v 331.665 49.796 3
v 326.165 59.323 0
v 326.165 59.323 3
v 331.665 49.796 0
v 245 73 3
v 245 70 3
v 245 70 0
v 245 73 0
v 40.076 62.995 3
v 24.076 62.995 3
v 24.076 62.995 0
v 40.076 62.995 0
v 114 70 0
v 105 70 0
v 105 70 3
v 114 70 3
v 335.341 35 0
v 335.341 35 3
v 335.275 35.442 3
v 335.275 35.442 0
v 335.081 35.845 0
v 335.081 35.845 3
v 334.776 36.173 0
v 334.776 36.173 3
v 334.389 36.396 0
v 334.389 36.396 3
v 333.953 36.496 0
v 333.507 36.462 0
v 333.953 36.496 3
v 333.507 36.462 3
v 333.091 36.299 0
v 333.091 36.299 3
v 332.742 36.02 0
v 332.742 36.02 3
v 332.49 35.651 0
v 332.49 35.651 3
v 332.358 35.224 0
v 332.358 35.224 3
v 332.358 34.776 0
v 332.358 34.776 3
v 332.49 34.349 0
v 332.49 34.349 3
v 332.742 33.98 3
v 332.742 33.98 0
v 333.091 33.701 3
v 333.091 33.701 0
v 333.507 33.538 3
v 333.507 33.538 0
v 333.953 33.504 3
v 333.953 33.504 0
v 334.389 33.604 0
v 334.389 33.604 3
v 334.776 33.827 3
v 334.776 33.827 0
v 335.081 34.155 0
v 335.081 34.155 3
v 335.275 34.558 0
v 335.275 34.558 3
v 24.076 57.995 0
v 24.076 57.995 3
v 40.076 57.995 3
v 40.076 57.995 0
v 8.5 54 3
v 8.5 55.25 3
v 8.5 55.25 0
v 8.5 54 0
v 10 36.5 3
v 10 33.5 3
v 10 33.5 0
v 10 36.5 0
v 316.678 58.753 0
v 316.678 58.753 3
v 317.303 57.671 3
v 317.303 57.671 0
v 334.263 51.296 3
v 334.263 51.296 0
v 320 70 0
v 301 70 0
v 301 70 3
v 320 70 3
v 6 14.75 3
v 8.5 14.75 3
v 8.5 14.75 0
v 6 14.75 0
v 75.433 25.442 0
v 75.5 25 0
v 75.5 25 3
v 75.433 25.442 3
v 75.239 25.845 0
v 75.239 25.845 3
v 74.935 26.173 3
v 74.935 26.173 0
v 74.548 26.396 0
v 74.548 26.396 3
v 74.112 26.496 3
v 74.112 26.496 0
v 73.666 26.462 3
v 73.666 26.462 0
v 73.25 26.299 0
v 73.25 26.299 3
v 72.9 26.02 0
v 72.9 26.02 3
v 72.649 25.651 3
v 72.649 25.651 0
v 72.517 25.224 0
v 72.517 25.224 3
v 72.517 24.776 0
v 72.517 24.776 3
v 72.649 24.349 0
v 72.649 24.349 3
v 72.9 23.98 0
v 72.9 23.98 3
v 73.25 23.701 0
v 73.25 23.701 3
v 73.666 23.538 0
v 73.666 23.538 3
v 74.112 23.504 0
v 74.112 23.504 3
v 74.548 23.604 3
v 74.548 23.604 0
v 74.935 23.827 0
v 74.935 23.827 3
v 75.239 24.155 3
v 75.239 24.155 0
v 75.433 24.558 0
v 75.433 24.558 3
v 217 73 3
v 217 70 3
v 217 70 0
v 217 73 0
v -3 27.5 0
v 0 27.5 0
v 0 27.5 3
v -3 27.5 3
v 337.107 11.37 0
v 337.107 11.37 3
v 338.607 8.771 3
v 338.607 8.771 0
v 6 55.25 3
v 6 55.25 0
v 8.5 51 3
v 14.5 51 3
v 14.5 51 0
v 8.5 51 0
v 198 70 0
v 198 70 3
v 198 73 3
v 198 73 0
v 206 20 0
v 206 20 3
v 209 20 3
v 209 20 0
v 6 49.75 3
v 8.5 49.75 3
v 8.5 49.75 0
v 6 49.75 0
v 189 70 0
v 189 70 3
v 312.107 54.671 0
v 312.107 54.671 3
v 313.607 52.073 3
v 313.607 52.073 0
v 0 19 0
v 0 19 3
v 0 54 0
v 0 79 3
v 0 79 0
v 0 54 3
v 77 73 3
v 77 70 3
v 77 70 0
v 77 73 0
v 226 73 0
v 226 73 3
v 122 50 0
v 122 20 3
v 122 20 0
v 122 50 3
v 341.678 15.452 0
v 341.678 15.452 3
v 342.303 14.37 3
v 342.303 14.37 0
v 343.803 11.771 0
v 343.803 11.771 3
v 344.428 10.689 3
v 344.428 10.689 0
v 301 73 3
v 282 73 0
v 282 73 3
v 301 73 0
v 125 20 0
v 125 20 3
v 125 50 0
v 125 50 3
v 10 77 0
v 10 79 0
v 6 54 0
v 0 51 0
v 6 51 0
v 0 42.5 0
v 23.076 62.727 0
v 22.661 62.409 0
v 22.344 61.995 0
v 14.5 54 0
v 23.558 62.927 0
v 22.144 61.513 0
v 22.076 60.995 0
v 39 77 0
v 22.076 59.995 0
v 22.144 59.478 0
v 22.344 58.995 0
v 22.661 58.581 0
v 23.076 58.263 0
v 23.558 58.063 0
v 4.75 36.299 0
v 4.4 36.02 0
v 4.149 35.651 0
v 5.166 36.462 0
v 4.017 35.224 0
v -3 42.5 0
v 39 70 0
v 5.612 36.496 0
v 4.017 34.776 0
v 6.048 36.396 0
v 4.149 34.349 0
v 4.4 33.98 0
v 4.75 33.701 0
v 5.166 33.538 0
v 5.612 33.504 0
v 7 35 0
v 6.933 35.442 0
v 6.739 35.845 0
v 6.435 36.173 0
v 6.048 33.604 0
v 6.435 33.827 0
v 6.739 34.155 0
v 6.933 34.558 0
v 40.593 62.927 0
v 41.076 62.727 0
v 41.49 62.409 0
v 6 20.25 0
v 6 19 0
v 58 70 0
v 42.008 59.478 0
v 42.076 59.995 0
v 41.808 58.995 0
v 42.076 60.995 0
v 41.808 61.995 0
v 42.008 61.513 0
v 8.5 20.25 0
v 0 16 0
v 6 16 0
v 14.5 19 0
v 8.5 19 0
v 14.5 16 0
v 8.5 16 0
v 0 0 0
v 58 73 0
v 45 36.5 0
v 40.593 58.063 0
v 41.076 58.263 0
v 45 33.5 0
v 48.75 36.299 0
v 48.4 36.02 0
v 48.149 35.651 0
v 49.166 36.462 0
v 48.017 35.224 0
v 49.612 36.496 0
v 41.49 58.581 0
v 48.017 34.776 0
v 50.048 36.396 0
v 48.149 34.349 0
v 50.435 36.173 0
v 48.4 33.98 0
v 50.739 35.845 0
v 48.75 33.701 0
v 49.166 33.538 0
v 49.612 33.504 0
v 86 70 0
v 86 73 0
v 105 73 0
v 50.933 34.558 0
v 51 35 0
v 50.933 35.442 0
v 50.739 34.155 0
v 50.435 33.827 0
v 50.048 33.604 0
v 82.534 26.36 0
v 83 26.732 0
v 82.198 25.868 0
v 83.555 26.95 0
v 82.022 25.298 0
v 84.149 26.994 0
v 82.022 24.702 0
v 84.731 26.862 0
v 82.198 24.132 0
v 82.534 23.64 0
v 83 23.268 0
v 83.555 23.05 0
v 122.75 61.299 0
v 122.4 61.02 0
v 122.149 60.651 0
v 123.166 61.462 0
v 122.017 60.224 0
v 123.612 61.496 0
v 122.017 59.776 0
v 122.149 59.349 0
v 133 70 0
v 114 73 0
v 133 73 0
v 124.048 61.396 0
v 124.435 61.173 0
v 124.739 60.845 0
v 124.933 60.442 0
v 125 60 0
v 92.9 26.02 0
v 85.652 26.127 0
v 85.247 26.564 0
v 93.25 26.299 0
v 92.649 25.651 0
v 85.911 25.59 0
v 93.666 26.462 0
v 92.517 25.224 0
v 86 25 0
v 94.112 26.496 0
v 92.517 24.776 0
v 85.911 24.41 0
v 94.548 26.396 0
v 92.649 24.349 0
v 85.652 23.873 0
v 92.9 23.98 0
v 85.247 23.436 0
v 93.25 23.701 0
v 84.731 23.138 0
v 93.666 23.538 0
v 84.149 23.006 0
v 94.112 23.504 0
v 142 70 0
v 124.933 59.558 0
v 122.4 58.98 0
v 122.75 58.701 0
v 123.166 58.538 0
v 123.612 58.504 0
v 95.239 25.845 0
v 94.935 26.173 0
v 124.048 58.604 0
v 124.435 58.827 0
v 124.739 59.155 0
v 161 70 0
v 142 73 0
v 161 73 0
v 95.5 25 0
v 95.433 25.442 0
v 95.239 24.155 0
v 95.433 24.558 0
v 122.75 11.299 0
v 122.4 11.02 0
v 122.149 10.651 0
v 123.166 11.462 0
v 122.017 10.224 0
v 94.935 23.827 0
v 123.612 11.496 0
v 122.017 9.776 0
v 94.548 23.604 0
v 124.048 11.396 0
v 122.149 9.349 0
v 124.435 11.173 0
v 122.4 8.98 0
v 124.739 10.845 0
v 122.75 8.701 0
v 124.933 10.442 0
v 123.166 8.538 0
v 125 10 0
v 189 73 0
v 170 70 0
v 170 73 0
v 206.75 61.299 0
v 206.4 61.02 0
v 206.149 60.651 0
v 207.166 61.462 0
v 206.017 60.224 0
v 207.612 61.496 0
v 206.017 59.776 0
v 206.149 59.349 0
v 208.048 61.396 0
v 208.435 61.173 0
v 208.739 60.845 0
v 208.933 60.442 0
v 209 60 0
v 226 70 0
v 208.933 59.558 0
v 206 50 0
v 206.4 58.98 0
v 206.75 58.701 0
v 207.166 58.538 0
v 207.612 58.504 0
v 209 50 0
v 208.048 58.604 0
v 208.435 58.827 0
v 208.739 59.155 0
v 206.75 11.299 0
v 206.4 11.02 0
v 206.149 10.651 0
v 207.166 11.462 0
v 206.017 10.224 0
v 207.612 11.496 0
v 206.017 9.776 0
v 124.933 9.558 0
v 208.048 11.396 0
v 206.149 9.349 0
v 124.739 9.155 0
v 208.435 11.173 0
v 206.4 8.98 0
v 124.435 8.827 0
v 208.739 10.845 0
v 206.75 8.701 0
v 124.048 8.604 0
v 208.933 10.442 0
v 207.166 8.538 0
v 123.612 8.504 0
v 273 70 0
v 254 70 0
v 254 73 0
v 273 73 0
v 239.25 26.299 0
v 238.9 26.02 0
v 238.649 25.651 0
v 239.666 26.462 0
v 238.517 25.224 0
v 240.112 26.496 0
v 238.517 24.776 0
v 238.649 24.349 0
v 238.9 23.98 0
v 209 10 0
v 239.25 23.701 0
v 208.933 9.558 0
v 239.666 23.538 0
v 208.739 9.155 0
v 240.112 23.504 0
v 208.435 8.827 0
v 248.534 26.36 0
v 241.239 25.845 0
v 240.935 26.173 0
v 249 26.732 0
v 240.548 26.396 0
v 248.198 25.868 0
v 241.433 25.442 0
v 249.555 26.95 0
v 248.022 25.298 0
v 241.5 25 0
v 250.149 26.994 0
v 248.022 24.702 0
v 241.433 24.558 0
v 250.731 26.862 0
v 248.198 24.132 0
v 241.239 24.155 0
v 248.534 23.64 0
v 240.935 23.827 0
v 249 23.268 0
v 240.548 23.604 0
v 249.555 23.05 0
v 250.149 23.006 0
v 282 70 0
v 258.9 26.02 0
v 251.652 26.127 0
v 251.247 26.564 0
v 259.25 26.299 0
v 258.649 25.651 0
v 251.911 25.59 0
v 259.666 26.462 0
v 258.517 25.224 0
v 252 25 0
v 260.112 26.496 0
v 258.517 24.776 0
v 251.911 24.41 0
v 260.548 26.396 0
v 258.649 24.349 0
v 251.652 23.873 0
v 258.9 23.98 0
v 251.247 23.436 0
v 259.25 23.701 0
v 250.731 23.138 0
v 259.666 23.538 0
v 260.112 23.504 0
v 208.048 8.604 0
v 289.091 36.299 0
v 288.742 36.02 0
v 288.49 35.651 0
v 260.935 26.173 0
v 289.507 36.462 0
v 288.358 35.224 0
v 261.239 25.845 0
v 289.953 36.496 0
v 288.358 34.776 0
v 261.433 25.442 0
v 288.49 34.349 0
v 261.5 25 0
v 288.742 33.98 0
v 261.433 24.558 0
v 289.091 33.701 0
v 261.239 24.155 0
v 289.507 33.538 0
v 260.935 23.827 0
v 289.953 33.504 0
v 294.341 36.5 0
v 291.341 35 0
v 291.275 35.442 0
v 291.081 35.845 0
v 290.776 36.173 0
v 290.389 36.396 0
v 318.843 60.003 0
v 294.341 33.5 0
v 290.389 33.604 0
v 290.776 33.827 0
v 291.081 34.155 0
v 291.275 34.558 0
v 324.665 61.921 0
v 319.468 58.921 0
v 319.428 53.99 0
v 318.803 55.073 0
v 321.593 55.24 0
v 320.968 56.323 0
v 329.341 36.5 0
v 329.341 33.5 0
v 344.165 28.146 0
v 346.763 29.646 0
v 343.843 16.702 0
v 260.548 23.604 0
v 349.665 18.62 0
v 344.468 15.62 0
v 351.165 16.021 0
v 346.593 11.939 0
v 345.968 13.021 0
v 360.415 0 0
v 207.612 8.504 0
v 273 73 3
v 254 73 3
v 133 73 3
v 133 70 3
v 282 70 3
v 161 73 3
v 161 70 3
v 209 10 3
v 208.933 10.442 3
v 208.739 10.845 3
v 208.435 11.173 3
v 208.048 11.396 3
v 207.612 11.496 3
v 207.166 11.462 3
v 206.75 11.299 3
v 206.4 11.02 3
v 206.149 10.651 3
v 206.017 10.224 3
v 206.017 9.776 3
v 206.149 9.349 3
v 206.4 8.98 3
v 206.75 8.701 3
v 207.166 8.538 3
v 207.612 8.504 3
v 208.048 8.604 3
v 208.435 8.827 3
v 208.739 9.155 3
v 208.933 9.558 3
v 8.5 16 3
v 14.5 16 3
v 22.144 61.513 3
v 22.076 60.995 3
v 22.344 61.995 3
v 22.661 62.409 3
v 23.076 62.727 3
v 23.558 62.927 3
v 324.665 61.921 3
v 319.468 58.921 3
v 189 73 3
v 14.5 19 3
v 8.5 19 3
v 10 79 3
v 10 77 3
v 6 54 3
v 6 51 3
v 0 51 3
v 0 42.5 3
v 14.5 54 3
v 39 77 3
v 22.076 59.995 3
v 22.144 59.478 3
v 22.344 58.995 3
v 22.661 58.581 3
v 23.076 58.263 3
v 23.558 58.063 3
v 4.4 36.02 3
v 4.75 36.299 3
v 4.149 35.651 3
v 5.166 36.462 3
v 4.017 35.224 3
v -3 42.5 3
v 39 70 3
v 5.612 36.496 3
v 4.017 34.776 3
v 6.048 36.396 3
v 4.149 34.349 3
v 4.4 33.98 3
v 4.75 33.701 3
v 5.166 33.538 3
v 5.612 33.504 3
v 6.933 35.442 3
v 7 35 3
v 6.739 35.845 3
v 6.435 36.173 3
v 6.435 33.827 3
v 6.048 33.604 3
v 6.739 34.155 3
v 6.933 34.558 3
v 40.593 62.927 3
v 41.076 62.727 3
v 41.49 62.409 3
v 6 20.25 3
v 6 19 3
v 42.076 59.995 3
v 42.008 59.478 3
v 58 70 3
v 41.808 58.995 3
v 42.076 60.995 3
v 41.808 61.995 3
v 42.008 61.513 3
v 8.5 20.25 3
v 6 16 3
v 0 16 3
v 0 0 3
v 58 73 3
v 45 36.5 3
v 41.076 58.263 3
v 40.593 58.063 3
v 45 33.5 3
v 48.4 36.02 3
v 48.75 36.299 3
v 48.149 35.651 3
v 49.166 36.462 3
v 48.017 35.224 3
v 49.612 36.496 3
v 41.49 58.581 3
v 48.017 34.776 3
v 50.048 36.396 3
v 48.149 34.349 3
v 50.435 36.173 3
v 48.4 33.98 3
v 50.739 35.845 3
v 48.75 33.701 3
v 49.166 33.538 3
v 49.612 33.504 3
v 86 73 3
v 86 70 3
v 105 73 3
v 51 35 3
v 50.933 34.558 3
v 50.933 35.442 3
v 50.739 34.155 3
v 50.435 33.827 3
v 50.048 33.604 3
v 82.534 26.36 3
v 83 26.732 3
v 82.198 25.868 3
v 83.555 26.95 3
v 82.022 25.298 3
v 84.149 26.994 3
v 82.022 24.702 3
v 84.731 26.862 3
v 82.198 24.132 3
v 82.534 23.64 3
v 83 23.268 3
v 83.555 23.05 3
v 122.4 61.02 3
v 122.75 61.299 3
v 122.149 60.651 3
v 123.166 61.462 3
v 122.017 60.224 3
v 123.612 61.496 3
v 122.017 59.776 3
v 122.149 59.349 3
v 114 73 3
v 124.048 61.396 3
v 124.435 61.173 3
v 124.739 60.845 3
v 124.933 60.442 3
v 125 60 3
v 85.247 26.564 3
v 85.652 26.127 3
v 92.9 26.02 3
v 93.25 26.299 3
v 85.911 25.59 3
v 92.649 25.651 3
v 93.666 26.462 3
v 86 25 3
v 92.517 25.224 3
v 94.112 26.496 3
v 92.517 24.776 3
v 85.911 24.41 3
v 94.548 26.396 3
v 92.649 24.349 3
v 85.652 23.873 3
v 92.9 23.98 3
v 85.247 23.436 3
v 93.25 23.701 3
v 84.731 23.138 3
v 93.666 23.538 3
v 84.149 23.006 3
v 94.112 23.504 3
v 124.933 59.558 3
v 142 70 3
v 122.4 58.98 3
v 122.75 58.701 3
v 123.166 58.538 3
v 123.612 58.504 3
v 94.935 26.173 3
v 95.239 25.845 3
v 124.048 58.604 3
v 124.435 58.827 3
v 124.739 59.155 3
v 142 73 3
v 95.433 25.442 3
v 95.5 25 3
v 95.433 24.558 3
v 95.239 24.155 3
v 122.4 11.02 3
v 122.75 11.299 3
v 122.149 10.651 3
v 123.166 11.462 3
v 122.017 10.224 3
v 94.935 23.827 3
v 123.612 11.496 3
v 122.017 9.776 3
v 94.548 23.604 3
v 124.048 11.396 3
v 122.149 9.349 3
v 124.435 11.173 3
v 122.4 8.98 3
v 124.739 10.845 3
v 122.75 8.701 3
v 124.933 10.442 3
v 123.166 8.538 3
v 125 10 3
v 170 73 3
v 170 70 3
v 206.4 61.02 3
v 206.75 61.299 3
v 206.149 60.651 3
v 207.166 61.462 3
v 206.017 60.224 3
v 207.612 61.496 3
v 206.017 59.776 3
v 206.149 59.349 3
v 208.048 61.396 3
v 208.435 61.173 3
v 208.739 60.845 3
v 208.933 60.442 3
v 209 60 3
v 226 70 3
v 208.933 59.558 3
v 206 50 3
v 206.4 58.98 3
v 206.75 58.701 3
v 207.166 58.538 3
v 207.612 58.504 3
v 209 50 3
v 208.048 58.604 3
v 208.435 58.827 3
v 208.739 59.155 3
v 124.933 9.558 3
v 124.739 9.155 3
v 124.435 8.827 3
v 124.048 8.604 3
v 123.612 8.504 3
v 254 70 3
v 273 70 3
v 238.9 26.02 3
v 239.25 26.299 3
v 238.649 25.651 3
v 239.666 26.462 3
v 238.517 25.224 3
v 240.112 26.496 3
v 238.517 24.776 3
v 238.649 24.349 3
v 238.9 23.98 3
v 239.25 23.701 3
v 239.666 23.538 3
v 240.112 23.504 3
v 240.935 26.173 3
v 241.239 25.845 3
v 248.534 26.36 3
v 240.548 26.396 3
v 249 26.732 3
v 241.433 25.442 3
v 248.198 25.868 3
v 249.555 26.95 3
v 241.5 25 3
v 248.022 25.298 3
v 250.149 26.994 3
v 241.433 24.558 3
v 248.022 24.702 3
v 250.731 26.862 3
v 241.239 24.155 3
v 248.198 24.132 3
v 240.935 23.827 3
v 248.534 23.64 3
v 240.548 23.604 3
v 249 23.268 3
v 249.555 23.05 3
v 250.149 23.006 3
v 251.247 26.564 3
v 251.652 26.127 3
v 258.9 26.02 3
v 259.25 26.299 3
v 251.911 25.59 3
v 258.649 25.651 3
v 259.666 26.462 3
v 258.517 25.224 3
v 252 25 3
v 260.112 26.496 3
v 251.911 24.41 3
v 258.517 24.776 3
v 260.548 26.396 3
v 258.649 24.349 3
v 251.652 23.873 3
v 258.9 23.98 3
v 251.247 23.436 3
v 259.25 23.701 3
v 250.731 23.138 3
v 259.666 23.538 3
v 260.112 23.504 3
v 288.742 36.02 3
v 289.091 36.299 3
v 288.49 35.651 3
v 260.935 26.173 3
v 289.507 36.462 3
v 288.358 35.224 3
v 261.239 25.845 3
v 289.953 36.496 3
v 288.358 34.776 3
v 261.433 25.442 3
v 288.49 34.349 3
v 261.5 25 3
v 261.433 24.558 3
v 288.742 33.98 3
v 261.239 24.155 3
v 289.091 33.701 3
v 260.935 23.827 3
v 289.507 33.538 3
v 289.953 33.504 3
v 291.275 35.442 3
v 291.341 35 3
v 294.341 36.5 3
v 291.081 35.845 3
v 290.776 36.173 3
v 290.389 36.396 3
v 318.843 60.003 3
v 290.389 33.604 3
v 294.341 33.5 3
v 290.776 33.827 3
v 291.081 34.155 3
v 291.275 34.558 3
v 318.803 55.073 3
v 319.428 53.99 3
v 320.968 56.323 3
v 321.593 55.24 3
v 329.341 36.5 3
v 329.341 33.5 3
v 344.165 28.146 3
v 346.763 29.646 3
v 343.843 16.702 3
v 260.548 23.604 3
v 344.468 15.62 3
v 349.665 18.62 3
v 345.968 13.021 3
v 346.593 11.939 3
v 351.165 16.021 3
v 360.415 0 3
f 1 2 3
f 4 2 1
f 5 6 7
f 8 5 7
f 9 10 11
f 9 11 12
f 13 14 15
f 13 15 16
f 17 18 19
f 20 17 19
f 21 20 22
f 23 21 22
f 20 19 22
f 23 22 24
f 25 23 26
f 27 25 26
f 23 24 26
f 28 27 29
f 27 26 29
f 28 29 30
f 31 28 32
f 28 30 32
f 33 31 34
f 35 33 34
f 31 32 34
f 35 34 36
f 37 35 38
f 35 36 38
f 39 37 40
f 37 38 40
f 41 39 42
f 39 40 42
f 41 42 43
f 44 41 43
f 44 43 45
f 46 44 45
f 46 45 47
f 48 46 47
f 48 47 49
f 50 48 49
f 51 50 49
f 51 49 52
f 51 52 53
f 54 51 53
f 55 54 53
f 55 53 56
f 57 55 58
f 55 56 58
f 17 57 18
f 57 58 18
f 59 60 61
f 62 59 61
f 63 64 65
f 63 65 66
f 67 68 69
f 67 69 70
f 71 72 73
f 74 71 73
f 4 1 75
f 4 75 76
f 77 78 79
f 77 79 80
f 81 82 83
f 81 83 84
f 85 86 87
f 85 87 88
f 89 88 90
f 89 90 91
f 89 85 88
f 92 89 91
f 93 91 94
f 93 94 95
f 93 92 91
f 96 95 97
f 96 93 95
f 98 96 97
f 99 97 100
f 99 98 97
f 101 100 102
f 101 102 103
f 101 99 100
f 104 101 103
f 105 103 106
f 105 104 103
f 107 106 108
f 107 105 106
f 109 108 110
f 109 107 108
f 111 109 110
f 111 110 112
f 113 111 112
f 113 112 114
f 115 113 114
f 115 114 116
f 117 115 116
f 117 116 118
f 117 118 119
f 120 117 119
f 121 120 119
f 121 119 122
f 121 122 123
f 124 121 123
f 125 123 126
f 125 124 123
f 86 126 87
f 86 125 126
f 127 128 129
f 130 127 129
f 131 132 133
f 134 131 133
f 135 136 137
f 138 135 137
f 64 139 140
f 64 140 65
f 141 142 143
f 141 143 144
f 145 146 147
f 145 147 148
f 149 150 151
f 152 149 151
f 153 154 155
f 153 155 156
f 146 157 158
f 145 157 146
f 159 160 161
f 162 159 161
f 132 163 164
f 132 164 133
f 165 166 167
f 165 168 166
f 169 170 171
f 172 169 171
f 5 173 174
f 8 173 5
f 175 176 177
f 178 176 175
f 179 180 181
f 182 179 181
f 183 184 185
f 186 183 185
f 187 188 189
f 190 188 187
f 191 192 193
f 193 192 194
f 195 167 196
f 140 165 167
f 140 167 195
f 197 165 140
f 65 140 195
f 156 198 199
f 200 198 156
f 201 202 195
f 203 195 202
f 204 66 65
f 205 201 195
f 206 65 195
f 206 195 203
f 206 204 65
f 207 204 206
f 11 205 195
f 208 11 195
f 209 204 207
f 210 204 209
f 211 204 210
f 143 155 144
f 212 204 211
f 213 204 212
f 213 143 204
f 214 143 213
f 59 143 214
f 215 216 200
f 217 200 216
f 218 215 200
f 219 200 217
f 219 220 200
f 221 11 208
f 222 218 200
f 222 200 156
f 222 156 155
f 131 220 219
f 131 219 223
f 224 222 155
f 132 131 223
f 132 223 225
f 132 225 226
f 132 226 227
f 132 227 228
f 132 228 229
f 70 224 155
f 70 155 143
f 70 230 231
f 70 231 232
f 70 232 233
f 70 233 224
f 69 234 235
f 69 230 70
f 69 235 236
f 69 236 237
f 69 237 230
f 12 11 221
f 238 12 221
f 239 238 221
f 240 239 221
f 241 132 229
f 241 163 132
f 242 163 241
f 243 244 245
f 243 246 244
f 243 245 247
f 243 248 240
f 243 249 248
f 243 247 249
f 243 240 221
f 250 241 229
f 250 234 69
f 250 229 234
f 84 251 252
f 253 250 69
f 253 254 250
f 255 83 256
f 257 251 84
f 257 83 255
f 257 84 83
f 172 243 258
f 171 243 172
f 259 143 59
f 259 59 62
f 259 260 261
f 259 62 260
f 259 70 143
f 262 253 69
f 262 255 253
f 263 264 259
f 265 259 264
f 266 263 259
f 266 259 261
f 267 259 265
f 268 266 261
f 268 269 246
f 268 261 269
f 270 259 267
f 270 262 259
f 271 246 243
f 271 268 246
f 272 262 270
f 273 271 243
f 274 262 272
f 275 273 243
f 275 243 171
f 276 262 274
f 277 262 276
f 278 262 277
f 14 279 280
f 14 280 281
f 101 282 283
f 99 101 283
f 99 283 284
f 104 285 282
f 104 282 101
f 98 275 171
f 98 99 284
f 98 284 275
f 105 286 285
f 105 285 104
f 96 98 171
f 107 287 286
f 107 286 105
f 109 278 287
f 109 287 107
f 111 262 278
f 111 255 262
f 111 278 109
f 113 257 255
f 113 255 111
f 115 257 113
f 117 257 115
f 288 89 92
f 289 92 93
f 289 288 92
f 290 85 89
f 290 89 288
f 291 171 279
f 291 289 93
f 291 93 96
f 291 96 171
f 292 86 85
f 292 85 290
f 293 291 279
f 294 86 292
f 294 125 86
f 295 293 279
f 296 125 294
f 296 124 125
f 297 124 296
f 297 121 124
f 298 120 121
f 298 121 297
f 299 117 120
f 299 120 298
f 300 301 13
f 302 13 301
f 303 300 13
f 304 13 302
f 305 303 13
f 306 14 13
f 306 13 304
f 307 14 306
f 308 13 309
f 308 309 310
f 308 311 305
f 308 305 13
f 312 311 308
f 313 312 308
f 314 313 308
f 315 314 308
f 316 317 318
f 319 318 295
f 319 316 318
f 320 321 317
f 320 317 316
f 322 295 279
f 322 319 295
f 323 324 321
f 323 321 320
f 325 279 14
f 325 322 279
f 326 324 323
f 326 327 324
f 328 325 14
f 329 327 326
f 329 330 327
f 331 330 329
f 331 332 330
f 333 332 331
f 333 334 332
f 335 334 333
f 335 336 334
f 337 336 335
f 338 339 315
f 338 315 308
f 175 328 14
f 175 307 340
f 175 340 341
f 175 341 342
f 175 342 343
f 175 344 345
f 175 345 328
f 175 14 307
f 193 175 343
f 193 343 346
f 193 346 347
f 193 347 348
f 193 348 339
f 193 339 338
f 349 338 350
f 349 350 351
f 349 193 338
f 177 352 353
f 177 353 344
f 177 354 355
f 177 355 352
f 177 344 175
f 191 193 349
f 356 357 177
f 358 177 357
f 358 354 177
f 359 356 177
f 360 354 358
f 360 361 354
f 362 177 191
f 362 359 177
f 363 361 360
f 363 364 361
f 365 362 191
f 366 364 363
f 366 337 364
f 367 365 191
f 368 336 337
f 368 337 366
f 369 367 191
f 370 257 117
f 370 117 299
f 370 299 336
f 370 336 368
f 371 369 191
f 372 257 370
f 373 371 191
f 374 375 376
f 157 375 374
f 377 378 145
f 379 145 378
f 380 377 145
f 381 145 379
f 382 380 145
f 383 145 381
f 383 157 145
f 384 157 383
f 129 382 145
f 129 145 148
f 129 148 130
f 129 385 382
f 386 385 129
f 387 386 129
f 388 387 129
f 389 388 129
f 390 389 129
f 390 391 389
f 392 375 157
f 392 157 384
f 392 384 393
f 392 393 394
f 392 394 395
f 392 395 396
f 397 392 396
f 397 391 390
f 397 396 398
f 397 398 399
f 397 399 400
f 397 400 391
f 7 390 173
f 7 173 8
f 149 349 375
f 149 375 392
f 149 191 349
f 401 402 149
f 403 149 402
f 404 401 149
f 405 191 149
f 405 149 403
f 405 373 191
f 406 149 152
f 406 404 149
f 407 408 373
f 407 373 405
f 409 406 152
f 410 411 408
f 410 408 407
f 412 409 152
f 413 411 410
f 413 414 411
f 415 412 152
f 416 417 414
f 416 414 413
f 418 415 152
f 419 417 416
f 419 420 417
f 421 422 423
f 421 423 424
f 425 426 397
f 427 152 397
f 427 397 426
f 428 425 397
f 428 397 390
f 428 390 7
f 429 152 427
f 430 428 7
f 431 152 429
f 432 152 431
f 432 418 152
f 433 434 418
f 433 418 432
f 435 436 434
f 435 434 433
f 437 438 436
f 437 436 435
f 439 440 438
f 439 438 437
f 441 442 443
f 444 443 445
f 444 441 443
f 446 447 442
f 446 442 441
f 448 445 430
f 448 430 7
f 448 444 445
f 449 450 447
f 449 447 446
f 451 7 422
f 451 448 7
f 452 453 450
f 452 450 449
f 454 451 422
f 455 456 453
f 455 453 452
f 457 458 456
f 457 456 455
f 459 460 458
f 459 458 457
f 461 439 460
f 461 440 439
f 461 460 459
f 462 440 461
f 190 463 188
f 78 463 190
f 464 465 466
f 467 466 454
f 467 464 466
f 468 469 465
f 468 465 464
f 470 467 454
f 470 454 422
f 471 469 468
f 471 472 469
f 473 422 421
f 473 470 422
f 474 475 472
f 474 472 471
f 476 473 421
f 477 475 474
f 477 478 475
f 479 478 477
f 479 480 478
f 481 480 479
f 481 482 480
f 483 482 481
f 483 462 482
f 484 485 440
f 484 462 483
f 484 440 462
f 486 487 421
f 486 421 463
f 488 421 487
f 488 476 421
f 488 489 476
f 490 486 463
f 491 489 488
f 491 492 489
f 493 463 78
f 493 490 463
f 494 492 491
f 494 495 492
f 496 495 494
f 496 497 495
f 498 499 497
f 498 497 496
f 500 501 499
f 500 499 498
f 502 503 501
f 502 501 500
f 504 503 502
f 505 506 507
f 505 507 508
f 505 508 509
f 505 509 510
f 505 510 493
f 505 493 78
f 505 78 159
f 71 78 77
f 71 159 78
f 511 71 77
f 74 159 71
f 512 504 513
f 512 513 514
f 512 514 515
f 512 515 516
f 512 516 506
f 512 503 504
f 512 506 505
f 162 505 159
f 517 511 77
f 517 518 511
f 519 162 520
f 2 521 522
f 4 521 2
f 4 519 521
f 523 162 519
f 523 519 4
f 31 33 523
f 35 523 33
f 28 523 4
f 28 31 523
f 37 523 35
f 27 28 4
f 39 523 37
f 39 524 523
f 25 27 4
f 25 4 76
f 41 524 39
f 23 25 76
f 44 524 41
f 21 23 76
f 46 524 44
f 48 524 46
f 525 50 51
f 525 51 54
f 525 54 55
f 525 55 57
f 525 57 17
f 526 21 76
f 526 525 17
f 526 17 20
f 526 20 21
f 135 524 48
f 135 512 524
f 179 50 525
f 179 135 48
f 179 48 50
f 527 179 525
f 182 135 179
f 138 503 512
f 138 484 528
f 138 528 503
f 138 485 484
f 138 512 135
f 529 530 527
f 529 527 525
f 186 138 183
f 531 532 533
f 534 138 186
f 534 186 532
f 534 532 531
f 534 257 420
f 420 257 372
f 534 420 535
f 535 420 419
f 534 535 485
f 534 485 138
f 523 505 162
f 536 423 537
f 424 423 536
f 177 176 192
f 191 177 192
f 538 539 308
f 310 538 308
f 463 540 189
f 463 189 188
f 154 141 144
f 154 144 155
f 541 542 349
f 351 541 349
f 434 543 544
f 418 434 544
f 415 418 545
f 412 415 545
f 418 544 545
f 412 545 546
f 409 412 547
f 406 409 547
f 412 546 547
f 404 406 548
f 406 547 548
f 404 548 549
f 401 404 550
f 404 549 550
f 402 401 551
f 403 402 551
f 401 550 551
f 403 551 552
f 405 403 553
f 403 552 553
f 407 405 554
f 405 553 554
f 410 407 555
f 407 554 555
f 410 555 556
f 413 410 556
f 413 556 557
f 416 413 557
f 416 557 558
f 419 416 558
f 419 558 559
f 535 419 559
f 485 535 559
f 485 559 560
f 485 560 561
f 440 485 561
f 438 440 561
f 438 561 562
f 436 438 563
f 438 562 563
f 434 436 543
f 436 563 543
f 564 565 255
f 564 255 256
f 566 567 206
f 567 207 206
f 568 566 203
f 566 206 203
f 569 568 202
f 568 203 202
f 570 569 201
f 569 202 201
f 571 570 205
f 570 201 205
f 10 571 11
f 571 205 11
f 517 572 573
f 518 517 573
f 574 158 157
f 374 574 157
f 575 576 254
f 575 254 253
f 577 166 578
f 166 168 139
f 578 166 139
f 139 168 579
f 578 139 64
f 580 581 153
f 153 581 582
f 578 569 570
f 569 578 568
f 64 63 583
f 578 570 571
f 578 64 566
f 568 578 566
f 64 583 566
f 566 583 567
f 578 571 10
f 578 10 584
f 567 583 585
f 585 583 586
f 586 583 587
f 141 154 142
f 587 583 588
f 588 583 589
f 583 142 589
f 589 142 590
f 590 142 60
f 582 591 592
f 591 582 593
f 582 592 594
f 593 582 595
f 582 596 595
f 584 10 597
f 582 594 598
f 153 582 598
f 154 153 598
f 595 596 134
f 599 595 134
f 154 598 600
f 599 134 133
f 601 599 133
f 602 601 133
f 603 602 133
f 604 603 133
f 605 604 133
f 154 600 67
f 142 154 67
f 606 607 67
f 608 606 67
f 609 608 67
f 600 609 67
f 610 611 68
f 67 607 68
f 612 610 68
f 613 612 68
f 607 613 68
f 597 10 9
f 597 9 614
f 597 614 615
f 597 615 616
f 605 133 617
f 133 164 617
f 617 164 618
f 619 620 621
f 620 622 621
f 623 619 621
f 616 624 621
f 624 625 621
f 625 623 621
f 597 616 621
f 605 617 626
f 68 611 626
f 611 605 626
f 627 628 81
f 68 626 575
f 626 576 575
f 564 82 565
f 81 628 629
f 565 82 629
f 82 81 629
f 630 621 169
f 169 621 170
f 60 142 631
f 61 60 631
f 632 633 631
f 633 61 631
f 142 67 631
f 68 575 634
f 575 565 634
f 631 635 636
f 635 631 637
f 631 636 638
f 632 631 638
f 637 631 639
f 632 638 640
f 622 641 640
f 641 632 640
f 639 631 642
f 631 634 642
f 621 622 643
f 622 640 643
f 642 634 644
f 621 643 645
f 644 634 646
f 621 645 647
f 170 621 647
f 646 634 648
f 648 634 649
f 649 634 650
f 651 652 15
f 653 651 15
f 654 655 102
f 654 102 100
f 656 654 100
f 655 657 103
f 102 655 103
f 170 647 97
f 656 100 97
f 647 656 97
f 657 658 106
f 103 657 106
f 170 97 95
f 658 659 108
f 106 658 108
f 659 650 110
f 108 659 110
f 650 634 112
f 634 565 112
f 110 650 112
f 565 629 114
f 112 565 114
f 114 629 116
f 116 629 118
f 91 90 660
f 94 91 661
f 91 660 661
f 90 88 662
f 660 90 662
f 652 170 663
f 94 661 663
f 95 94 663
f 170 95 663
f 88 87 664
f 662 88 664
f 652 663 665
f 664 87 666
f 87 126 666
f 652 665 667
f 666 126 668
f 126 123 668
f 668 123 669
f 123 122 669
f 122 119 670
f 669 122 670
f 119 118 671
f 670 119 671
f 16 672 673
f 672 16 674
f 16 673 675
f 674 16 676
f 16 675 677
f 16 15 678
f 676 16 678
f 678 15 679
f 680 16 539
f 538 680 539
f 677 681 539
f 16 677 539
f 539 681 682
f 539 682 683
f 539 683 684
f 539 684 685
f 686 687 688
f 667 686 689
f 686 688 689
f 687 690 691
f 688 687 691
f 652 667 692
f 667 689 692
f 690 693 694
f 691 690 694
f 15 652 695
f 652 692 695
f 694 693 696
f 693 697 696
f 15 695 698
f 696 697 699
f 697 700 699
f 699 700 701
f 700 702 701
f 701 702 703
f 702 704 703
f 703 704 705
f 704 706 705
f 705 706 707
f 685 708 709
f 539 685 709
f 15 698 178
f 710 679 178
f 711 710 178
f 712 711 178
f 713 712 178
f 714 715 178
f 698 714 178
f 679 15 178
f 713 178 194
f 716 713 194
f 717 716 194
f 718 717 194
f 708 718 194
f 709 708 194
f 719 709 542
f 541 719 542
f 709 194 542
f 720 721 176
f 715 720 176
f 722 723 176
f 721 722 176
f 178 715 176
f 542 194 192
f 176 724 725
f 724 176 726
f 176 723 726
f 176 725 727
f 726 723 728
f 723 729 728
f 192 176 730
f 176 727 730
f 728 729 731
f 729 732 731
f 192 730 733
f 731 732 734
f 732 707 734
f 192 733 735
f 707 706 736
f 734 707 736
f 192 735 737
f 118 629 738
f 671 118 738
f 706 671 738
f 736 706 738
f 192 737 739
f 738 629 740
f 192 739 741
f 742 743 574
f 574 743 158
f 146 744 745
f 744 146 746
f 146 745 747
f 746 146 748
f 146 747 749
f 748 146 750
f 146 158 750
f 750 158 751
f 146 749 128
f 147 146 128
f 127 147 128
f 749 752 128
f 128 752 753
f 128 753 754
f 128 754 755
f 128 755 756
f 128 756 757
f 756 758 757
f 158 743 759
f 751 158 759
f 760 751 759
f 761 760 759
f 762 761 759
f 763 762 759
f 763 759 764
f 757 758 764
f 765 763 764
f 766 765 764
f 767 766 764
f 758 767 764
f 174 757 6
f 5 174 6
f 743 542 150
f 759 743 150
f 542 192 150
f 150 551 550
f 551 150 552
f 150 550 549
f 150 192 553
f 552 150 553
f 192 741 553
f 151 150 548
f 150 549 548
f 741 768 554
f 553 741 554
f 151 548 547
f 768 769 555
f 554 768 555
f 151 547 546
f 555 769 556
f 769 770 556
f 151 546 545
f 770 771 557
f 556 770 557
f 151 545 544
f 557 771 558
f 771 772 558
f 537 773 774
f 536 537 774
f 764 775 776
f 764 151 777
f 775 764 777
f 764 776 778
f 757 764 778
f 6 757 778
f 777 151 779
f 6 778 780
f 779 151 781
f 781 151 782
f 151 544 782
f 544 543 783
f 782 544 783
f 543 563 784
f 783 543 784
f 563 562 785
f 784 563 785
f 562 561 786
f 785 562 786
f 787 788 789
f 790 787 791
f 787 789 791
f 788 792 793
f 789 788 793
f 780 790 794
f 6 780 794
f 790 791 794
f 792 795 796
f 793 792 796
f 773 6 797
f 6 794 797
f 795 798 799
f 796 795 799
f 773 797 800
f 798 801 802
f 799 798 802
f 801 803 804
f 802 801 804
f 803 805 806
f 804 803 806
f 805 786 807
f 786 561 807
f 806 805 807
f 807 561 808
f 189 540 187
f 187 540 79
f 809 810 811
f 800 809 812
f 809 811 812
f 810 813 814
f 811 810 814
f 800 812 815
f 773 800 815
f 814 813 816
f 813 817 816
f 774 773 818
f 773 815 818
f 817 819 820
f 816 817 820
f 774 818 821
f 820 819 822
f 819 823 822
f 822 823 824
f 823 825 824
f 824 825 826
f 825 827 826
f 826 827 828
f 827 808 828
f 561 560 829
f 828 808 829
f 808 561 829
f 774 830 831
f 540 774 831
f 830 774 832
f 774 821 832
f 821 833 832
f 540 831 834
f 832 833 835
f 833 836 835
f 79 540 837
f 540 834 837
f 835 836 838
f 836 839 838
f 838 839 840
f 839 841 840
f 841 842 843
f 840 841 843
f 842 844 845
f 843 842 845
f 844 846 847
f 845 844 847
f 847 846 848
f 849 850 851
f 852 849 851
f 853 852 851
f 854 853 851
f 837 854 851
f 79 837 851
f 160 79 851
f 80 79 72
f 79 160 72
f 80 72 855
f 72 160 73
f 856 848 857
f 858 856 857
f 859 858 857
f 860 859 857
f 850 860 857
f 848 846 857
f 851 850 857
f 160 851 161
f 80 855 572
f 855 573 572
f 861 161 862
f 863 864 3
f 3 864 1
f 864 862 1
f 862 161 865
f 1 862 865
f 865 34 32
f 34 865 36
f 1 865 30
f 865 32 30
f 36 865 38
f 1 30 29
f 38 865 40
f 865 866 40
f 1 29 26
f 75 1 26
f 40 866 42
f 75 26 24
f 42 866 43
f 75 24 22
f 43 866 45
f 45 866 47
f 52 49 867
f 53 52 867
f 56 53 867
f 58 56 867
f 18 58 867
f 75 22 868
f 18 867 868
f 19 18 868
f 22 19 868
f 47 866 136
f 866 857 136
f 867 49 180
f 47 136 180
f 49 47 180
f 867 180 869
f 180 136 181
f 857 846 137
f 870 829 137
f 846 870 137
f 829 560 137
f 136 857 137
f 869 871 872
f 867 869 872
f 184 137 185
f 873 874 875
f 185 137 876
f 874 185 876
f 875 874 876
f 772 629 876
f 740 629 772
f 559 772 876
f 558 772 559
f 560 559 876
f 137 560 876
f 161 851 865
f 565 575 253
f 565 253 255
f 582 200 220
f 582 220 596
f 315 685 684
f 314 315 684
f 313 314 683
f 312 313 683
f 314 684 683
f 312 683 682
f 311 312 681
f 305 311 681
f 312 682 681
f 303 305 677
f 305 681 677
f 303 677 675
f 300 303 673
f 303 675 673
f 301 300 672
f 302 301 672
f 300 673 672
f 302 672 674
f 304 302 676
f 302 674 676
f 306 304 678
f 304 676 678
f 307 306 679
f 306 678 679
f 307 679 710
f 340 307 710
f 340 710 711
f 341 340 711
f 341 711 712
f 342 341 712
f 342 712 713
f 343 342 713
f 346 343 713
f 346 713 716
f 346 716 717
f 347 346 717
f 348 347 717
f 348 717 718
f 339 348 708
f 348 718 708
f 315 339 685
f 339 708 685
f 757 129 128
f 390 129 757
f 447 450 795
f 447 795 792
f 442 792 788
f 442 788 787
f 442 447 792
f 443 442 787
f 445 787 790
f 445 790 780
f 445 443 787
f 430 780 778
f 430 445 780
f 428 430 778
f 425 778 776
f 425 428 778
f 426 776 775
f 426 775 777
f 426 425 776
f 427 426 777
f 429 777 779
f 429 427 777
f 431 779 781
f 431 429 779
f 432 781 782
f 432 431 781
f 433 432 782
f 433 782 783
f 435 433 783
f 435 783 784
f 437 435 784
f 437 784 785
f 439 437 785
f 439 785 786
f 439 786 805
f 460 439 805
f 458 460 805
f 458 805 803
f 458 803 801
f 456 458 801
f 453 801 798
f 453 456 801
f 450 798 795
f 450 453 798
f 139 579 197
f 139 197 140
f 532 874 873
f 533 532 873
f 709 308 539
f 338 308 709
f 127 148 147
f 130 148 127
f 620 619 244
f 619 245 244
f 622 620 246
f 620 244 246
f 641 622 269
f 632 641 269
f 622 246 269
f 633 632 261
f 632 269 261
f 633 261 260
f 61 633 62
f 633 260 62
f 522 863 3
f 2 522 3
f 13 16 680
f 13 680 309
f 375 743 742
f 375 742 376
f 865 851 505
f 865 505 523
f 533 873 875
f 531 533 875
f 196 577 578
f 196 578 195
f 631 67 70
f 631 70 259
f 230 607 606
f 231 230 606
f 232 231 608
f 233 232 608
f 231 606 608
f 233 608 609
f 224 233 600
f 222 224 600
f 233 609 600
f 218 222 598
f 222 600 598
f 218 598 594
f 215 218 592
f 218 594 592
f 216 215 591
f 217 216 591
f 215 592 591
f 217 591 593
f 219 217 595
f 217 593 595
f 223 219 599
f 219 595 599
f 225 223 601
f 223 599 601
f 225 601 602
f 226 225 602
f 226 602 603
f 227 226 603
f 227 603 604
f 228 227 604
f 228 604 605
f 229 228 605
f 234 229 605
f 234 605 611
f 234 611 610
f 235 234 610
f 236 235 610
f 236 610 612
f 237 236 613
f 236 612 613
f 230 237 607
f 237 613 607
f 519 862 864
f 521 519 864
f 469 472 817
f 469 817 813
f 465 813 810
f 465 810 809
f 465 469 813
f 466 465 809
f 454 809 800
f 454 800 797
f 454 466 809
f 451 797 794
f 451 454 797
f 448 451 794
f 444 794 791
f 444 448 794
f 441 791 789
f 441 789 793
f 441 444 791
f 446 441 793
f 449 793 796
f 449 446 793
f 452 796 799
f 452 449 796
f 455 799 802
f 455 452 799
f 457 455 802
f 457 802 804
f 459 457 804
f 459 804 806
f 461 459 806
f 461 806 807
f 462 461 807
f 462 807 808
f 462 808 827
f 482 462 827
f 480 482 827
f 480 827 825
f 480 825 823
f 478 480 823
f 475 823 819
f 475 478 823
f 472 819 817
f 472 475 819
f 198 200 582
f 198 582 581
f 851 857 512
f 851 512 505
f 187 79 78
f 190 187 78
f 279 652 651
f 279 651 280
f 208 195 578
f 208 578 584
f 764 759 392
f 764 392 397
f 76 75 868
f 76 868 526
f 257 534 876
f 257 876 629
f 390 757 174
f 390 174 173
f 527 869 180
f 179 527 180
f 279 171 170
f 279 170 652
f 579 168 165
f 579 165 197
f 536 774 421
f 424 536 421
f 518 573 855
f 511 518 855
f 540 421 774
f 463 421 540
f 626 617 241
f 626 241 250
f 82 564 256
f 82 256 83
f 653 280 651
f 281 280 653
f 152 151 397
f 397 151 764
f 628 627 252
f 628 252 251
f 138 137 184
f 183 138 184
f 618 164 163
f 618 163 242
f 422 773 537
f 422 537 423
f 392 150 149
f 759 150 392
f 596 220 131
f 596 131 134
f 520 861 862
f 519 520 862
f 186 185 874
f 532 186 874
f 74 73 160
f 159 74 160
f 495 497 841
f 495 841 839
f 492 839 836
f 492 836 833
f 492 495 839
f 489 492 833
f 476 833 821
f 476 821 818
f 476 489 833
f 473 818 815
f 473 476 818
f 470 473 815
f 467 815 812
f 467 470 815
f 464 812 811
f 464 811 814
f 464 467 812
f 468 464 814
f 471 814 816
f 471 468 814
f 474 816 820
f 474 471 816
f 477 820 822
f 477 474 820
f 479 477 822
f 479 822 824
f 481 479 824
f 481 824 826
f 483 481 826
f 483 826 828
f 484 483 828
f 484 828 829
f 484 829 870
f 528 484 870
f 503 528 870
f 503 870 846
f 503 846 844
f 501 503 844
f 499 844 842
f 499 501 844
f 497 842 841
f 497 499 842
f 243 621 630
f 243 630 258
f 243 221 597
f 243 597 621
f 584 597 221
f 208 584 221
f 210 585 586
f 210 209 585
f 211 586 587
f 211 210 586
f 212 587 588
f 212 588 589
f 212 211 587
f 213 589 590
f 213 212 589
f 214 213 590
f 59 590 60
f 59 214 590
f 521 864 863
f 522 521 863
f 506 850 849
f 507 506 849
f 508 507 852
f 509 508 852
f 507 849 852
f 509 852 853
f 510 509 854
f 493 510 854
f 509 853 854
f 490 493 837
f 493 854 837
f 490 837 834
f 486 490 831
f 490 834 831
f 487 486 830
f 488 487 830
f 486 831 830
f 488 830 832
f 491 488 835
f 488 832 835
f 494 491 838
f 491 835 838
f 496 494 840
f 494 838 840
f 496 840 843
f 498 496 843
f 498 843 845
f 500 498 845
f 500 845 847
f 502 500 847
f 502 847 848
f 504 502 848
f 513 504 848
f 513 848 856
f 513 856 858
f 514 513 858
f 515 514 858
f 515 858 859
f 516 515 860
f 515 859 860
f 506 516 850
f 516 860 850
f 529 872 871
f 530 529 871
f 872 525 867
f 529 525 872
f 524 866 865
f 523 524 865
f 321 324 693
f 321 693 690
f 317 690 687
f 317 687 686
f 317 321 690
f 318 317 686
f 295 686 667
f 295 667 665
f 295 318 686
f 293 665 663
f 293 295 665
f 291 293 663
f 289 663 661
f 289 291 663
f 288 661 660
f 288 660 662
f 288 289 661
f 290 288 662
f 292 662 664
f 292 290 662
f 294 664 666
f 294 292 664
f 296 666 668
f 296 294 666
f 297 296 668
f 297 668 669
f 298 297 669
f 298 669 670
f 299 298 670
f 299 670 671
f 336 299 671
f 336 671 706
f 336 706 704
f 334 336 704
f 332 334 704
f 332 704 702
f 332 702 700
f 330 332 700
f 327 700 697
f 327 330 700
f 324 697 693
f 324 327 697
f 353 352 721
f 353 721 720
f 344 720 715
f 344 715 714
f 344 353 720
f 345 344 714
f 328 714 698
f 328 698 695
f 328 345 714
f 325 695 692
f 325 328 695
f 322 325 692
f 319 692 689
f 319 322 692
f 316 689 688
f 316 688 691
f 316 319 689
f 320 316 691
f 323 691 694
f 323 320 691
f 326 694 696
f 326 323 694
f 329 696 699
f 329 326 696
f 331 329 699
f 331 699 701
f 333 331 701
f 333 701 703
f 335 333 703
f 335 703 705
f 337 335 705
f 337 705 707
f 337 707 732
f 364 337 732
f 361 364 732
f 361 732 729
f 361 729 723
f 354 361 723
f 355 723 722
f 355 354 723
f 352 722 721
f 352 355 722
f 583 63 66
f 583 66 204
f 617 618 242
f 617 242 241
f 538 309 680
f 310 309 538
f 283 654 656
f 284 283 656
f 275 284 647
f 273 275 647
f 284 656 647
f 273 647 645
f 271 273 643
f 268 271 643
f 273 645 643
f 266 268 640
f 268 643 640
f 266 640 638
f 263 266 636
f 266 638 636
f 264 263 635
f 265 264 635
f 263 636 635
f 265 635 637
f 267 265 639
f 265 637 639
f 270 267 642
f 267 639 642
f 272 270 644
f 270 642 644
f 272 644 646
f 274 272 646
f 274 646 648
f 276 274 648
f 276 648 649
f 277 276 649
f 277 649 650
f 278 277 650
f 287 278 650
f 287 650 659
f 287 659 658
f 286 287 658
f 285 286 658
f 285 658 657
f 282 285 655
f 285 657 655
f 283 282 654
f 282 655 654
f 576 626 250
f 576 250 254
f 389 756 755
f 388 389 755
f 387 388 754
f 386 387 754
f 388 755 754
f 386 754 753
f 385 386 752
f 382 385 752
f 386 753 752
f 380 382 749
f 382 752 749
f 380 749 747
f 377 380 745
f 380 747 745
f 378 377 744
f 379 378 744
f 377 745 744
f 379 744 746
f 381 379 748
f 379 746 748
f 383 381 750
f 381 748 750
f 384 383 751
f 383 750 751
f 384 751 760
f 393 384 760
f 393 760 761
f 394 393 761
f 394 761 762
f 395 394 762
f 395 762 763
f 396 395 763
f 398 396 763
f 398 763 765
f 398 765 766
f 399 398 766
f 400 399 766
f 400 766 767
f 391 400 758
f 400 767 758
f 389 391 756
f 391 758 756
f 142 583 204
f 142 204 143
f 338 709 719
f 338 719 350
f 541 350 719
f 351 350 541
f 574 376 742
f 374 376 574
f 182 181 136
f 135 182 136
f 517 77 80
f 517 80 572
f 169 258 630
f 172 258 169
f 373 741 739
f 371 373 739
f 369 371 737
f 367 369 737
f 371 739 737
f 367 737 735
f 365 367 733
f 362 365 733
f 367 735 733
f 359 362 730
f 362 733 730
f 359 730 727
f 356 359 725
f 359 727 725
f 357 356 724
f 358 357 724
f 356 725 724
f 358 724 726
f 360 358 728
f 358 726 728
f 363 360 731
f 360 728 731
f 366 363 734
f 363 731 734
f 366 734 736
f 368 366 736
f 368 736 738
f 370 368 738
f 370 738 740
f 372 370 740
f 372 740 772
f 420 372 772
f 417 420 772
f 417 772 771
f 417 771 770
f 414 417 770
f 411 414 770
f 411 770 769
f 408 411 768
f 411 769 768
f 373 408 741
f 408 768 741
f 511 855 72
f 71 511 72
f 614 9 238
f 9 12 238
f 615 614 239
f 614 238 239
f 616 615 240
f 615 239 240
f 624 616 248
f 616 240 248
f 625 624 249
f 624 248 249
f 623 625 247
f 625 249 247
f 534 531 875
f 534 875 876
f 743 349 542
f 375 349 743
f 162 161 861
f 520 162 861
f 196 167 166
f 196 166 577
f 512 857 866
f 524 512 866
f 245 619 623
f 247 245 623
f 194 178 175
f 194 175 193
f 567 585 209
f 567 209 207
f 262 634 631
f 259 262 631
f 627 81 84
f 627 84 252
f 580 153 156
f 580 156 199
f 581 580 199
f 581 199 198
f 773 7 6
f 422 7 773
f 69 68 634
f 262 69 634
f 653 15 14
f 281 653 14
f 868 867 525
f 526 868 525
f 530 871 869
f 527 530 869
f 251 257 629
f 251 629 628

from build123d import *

# Parameters (mm, degrees)
SKETCH_1_R             = 2
SKETCH_1_R_2           = 1.5
EXTRUDE_1_DEPTH        = 3
SKETCH_2_W             = 19
SKETCH_2_H             = 3
EXTRUDE_2_DEPTH        = 3
PATTERN_LINEAR_1_COUNT = 9
PATTERN_LINEAR_1_PITCH = 28
SKETCH_3_W             = 3
SKETCH_3_H             = 30
CUT_EXTRUDE_1_DEPTH    = 3
SKETCH_4_W             = 35
SKETCH_4_H             = 3
CUT_EXTRUDE_2_DEPTH    = 3
SKETCH_5_R             = 1.5
CUT_EXTRUDE_3_DEPTH    = 3
CUT_EXTRUDE_4_DEPTH    = 3
CUT_EXTRUDE_5_DEPTH    = 3
SKETCH_8_W             = 39
SKETCH_8_H             = 3
EXTRUDE_3_DEPTH        = 9
SKETCH_9_W             = 29
SKETCH_9_H             = 3
CUT_EXTRUDE_6_DEPTH    = 2
SKETCH_11_W            = 3
SKETCH_11_H            = 25
EXTRUDE_5_DEPTH        = 3
SKETCH_12_W            = 3
SKETCH_12_H            = 15
EXTRUDE_6_DEPTH        = 3
SKETCH_13_W            = 20
SKETCH_13_H            = 5
CUT_EXTRUDE_7_DEPTH    = 3
FILLET_1_R             = 2


with BuildPart() as part:
    # Эскиз1 → Бобышка-Вытянуть1 (new body)
    with BuildSketch(Plane.XY):
        Polygon((320, 70), (360.414518843, 0), (0, 0), (0, 70), align=None)
        with Locations((84, 25)):
            Circle(SKETCH_1_R, mode=Mode.SUBTRACT)
        with Locations((250, 25)):
            Circle(SKETCH_1_R, mode=Mode.SUBTRACT)
        with Locations((94, 25)):
            Circle(SKETCH_1_R_2, mode=Mode.SUBTRACT)
        with Locations((74, 25)):
            Circle(SKETCH_1_R_2, mode=Mode.SUBTRACT)
        with Locations((240, 25)):
            Circle(SKETCH_1_R_2, mode=Mode.SUBTRACT)
        with Locations((260, 25)):
            Circle(SKETCH_1_R_2, mode=Mode.SUBTRACT)
    extrude(amount=EXTRUDE_1_DEPTH)

    # Эскиз2 → Бобышка-Вытянуть2 (add)
    with BuildSketch(Plane(origin=(0, 70, 0), x_dir=(1, 0, 0), z_dir=(0, 1, 0))):
        with Locations((291.5, -1.5)):
            Rectangle(SKETCH_2_W, SKETCH_2_H)
    extrude_2 = extrude(amount=EXTRUDE_2_DEPTH)

    # Линейный массив1: Бобышка-Вытянуть2 ×9
    with Locations(*[(-i * PATTERN_LINEAR_1_PITCH, 0, 0) for i in range(1, PATTERN_LINEAR_1_COUNT)]):
        add(extrude_2)

    # Эскиз3 → Вырез-Вытянуть1 (cut)
    with BuildSketch(Plane.XY.offset(3)):
        with Locations((207.5, 35)):
            Rectangle(SKETCH_3_W, SKETCH_3_H)
        with Locations((123.5, 35)):
            Rectangle(SKETCH_3_W, SKETCH_3_H)
    extrude(amount=-CUT_EXTRUDE_1_DEPTH, mode=Mode.SUBTRACT)

    # Эскиз4 → Вырез-Вытянуть2 (cut)
    with BuildSketch(Plane.XY.offset(3)):
        with Locations((311.841234018, 35)):
            Rectangle(SKETCH_4_W, SKETCH_4_H)
        with Locations((27.5, 35)):
            Rectangle(SKETCH_4_W, SKETCH_4_H)
    extrude(amount=-CUT_EXTRUDE_2_DEPTH, mode=Mode.SUBTRACT)

    # Эскиз5 → Вырез-Вытянуть3 (cut)
    with BuildSketch(Plane.XY.offset(3)):
        with Locations((5.5, 35)):
            Circle(SKETCH_5_R)
        with Locations((49.5, 35)):
            Circle(SKETCH_5_R)
        with Locations((123.5, 60)):
            Circle(SKETCH_5_R)
        with Locations((123.5, 10)):
            Circle(SKETCH_5_R)
        with Locations((207.5, 60)):
            Circle(SKETCH_5_R)
        with Locations((207.5, 10)):
            Circle(SKETCH_5_R)
        with Locations((289.841234018, 35)):
            Circle(SKETCH_5_R)
        with Locations((333.841234018, 35)):
            Circle(SKETCH_5_R)
    extrude(amount=-CUT_EXTRUDE_3_DEPTH, mode=Mode.SUBTRACT)

    # Эскиз6 → Вырез-Вытянуть4 (cut)
    with BuildSketch(Plane.XY.offset(3)):
        Polygon((0, 54), (6, 54), (6, 55.25), (8.5, 55.25), (8.5, 54), (14.5, 54), (14.5, 51), (8.5, 51), (8.5, 49.75), (6, 49.75), (6, 51), (0, 51), align=None)
        Polygon((0, 19), (6, 19), (6, 20.25), (8.5, 20.25), (8.5, 19), (14.5, 19), (14.5, 16), (8.5, 16), (8.5, 14.75), (6, 14.75), (6, 16), (0, 16), align=None)
    extrude(amount=-CUT_EXTRUDE_4_DEPTH, mode=Mode.SUBTRACT)

    # Эскиз7 → Вырез-Вытянуть5 (cut)
    with BuildSketch(Plane.XY.offset(3)):
        Polygon((324.664518843, 61.920816371), (319.468366421, 58.920816371), (318.843366421, 60.003348125), (316.678302911, 58.753348125), (317.303302911, 57.670816371), (312.107150488, 54.670816371), (313.607150488, 52.072740159), (318.803302911, 55.072740159), (319.428302911, 53.990208405), (321.593366421, 55.240208405), (320.968366421, 56.322740159), (326.164518843, 59.322740159), align=None)
        Polygon((349.664518843, 18.619546181), (344.468366421, 15.619546181), (343.843366421, 16.702077936), (341.678302911, 15.452077936), (342.303302911, 14.369546181), (337.107150488, 11.369546181), (338.607150488, 8.77146997), (343.803302911, 11.77146997), (344.428302911, 10.688938215), (346.593366421, 11.938938215), (345.968366421, 13.02146997), (351.164518843, 16.02146997), align=None)
    extrude(amount=-CUT_EXTRUDE_5_DEPTH, mode=Mode.SUBTRACT)

    # Эскиз8 → Бобышка-Вытянуть3 (add)
    with BuildSketch(Plane(origin=(0, 70, 0), x_dir=(1, 0, 0), z_dir=(0, 1, 0))):
        with Locations((19.5, -1.5)):
            Rectangle(SKETCH_8_W, SKETCH_8_H)
    extrude(amount=EXTRUDE_3_DEPTH)

    # Эскиз9 → Вырез-Вытянуть6 (cut)
    with BuildSketch(Plane(origin=(0, 79, 0), x_dir=(1, 0, 0), z_dir=(0, 1, 0))):
        with Locations((24.5, -1.5)):
            Rectangle(SKETCH_9_W, SKETCH_9_H)
    extrude(amount=-CUT_EXTRUDE_6_DEPTH, mode=Mode.SUBTRACT)

    # Эскиз11 → Бобышка-Вытянуть5 (add)
    with BuildSketch(Plane(origin=(270.310889132, 156.064064606, 0), x_dir=(0, 0, -1), z_dir=(0.8660254037844416, 0.4999999999999949, 0))):
        with Locations((-1.5, -135.207259422)):
            Rectangle(SKETCH_11_W, SKETCH_11_H)
    extrude(amount=EXTRUDE_5_DEPTH)

    # Эскиз12 → Бобышка-Вытянуть6 (add)
    with BuildSketch(Plane.ZY):
        with Locations((1.5, 35)):
            Rectangle(SKETCH_12_W, SKETCH_12_H)
    extrude(amount=EXTRUDE_6_DEPTH)

    # Эскиз13 → Вырез-Вытянуть7 (cut)
    with BuildSketch(Plane.XY.offset(3)):
        with Locations((32.07564967, 60.49517076)):
            Rectangle(SKETCH_13_W, SKETCH_13_H)
    extrude(amount=-CUT_EXTRUDE_7_DEPTH, mode=Mode.SUBTRACT)

    # Скругление1
    fillet_1_edges = [part.edges().sort_by_distance(p)[0] for p in [
        (22.07564967, 57.99517076, 1.5),
        (22.07564967, 62.99517076, 1.5),
        (42.07564967, 62.99517076, 1.5),
        (42.07564967, 57.99517076, 1.5),
    ]]
    fillet(fillet_1_edges, radius=FILLET_1_R)


solid = part.part
